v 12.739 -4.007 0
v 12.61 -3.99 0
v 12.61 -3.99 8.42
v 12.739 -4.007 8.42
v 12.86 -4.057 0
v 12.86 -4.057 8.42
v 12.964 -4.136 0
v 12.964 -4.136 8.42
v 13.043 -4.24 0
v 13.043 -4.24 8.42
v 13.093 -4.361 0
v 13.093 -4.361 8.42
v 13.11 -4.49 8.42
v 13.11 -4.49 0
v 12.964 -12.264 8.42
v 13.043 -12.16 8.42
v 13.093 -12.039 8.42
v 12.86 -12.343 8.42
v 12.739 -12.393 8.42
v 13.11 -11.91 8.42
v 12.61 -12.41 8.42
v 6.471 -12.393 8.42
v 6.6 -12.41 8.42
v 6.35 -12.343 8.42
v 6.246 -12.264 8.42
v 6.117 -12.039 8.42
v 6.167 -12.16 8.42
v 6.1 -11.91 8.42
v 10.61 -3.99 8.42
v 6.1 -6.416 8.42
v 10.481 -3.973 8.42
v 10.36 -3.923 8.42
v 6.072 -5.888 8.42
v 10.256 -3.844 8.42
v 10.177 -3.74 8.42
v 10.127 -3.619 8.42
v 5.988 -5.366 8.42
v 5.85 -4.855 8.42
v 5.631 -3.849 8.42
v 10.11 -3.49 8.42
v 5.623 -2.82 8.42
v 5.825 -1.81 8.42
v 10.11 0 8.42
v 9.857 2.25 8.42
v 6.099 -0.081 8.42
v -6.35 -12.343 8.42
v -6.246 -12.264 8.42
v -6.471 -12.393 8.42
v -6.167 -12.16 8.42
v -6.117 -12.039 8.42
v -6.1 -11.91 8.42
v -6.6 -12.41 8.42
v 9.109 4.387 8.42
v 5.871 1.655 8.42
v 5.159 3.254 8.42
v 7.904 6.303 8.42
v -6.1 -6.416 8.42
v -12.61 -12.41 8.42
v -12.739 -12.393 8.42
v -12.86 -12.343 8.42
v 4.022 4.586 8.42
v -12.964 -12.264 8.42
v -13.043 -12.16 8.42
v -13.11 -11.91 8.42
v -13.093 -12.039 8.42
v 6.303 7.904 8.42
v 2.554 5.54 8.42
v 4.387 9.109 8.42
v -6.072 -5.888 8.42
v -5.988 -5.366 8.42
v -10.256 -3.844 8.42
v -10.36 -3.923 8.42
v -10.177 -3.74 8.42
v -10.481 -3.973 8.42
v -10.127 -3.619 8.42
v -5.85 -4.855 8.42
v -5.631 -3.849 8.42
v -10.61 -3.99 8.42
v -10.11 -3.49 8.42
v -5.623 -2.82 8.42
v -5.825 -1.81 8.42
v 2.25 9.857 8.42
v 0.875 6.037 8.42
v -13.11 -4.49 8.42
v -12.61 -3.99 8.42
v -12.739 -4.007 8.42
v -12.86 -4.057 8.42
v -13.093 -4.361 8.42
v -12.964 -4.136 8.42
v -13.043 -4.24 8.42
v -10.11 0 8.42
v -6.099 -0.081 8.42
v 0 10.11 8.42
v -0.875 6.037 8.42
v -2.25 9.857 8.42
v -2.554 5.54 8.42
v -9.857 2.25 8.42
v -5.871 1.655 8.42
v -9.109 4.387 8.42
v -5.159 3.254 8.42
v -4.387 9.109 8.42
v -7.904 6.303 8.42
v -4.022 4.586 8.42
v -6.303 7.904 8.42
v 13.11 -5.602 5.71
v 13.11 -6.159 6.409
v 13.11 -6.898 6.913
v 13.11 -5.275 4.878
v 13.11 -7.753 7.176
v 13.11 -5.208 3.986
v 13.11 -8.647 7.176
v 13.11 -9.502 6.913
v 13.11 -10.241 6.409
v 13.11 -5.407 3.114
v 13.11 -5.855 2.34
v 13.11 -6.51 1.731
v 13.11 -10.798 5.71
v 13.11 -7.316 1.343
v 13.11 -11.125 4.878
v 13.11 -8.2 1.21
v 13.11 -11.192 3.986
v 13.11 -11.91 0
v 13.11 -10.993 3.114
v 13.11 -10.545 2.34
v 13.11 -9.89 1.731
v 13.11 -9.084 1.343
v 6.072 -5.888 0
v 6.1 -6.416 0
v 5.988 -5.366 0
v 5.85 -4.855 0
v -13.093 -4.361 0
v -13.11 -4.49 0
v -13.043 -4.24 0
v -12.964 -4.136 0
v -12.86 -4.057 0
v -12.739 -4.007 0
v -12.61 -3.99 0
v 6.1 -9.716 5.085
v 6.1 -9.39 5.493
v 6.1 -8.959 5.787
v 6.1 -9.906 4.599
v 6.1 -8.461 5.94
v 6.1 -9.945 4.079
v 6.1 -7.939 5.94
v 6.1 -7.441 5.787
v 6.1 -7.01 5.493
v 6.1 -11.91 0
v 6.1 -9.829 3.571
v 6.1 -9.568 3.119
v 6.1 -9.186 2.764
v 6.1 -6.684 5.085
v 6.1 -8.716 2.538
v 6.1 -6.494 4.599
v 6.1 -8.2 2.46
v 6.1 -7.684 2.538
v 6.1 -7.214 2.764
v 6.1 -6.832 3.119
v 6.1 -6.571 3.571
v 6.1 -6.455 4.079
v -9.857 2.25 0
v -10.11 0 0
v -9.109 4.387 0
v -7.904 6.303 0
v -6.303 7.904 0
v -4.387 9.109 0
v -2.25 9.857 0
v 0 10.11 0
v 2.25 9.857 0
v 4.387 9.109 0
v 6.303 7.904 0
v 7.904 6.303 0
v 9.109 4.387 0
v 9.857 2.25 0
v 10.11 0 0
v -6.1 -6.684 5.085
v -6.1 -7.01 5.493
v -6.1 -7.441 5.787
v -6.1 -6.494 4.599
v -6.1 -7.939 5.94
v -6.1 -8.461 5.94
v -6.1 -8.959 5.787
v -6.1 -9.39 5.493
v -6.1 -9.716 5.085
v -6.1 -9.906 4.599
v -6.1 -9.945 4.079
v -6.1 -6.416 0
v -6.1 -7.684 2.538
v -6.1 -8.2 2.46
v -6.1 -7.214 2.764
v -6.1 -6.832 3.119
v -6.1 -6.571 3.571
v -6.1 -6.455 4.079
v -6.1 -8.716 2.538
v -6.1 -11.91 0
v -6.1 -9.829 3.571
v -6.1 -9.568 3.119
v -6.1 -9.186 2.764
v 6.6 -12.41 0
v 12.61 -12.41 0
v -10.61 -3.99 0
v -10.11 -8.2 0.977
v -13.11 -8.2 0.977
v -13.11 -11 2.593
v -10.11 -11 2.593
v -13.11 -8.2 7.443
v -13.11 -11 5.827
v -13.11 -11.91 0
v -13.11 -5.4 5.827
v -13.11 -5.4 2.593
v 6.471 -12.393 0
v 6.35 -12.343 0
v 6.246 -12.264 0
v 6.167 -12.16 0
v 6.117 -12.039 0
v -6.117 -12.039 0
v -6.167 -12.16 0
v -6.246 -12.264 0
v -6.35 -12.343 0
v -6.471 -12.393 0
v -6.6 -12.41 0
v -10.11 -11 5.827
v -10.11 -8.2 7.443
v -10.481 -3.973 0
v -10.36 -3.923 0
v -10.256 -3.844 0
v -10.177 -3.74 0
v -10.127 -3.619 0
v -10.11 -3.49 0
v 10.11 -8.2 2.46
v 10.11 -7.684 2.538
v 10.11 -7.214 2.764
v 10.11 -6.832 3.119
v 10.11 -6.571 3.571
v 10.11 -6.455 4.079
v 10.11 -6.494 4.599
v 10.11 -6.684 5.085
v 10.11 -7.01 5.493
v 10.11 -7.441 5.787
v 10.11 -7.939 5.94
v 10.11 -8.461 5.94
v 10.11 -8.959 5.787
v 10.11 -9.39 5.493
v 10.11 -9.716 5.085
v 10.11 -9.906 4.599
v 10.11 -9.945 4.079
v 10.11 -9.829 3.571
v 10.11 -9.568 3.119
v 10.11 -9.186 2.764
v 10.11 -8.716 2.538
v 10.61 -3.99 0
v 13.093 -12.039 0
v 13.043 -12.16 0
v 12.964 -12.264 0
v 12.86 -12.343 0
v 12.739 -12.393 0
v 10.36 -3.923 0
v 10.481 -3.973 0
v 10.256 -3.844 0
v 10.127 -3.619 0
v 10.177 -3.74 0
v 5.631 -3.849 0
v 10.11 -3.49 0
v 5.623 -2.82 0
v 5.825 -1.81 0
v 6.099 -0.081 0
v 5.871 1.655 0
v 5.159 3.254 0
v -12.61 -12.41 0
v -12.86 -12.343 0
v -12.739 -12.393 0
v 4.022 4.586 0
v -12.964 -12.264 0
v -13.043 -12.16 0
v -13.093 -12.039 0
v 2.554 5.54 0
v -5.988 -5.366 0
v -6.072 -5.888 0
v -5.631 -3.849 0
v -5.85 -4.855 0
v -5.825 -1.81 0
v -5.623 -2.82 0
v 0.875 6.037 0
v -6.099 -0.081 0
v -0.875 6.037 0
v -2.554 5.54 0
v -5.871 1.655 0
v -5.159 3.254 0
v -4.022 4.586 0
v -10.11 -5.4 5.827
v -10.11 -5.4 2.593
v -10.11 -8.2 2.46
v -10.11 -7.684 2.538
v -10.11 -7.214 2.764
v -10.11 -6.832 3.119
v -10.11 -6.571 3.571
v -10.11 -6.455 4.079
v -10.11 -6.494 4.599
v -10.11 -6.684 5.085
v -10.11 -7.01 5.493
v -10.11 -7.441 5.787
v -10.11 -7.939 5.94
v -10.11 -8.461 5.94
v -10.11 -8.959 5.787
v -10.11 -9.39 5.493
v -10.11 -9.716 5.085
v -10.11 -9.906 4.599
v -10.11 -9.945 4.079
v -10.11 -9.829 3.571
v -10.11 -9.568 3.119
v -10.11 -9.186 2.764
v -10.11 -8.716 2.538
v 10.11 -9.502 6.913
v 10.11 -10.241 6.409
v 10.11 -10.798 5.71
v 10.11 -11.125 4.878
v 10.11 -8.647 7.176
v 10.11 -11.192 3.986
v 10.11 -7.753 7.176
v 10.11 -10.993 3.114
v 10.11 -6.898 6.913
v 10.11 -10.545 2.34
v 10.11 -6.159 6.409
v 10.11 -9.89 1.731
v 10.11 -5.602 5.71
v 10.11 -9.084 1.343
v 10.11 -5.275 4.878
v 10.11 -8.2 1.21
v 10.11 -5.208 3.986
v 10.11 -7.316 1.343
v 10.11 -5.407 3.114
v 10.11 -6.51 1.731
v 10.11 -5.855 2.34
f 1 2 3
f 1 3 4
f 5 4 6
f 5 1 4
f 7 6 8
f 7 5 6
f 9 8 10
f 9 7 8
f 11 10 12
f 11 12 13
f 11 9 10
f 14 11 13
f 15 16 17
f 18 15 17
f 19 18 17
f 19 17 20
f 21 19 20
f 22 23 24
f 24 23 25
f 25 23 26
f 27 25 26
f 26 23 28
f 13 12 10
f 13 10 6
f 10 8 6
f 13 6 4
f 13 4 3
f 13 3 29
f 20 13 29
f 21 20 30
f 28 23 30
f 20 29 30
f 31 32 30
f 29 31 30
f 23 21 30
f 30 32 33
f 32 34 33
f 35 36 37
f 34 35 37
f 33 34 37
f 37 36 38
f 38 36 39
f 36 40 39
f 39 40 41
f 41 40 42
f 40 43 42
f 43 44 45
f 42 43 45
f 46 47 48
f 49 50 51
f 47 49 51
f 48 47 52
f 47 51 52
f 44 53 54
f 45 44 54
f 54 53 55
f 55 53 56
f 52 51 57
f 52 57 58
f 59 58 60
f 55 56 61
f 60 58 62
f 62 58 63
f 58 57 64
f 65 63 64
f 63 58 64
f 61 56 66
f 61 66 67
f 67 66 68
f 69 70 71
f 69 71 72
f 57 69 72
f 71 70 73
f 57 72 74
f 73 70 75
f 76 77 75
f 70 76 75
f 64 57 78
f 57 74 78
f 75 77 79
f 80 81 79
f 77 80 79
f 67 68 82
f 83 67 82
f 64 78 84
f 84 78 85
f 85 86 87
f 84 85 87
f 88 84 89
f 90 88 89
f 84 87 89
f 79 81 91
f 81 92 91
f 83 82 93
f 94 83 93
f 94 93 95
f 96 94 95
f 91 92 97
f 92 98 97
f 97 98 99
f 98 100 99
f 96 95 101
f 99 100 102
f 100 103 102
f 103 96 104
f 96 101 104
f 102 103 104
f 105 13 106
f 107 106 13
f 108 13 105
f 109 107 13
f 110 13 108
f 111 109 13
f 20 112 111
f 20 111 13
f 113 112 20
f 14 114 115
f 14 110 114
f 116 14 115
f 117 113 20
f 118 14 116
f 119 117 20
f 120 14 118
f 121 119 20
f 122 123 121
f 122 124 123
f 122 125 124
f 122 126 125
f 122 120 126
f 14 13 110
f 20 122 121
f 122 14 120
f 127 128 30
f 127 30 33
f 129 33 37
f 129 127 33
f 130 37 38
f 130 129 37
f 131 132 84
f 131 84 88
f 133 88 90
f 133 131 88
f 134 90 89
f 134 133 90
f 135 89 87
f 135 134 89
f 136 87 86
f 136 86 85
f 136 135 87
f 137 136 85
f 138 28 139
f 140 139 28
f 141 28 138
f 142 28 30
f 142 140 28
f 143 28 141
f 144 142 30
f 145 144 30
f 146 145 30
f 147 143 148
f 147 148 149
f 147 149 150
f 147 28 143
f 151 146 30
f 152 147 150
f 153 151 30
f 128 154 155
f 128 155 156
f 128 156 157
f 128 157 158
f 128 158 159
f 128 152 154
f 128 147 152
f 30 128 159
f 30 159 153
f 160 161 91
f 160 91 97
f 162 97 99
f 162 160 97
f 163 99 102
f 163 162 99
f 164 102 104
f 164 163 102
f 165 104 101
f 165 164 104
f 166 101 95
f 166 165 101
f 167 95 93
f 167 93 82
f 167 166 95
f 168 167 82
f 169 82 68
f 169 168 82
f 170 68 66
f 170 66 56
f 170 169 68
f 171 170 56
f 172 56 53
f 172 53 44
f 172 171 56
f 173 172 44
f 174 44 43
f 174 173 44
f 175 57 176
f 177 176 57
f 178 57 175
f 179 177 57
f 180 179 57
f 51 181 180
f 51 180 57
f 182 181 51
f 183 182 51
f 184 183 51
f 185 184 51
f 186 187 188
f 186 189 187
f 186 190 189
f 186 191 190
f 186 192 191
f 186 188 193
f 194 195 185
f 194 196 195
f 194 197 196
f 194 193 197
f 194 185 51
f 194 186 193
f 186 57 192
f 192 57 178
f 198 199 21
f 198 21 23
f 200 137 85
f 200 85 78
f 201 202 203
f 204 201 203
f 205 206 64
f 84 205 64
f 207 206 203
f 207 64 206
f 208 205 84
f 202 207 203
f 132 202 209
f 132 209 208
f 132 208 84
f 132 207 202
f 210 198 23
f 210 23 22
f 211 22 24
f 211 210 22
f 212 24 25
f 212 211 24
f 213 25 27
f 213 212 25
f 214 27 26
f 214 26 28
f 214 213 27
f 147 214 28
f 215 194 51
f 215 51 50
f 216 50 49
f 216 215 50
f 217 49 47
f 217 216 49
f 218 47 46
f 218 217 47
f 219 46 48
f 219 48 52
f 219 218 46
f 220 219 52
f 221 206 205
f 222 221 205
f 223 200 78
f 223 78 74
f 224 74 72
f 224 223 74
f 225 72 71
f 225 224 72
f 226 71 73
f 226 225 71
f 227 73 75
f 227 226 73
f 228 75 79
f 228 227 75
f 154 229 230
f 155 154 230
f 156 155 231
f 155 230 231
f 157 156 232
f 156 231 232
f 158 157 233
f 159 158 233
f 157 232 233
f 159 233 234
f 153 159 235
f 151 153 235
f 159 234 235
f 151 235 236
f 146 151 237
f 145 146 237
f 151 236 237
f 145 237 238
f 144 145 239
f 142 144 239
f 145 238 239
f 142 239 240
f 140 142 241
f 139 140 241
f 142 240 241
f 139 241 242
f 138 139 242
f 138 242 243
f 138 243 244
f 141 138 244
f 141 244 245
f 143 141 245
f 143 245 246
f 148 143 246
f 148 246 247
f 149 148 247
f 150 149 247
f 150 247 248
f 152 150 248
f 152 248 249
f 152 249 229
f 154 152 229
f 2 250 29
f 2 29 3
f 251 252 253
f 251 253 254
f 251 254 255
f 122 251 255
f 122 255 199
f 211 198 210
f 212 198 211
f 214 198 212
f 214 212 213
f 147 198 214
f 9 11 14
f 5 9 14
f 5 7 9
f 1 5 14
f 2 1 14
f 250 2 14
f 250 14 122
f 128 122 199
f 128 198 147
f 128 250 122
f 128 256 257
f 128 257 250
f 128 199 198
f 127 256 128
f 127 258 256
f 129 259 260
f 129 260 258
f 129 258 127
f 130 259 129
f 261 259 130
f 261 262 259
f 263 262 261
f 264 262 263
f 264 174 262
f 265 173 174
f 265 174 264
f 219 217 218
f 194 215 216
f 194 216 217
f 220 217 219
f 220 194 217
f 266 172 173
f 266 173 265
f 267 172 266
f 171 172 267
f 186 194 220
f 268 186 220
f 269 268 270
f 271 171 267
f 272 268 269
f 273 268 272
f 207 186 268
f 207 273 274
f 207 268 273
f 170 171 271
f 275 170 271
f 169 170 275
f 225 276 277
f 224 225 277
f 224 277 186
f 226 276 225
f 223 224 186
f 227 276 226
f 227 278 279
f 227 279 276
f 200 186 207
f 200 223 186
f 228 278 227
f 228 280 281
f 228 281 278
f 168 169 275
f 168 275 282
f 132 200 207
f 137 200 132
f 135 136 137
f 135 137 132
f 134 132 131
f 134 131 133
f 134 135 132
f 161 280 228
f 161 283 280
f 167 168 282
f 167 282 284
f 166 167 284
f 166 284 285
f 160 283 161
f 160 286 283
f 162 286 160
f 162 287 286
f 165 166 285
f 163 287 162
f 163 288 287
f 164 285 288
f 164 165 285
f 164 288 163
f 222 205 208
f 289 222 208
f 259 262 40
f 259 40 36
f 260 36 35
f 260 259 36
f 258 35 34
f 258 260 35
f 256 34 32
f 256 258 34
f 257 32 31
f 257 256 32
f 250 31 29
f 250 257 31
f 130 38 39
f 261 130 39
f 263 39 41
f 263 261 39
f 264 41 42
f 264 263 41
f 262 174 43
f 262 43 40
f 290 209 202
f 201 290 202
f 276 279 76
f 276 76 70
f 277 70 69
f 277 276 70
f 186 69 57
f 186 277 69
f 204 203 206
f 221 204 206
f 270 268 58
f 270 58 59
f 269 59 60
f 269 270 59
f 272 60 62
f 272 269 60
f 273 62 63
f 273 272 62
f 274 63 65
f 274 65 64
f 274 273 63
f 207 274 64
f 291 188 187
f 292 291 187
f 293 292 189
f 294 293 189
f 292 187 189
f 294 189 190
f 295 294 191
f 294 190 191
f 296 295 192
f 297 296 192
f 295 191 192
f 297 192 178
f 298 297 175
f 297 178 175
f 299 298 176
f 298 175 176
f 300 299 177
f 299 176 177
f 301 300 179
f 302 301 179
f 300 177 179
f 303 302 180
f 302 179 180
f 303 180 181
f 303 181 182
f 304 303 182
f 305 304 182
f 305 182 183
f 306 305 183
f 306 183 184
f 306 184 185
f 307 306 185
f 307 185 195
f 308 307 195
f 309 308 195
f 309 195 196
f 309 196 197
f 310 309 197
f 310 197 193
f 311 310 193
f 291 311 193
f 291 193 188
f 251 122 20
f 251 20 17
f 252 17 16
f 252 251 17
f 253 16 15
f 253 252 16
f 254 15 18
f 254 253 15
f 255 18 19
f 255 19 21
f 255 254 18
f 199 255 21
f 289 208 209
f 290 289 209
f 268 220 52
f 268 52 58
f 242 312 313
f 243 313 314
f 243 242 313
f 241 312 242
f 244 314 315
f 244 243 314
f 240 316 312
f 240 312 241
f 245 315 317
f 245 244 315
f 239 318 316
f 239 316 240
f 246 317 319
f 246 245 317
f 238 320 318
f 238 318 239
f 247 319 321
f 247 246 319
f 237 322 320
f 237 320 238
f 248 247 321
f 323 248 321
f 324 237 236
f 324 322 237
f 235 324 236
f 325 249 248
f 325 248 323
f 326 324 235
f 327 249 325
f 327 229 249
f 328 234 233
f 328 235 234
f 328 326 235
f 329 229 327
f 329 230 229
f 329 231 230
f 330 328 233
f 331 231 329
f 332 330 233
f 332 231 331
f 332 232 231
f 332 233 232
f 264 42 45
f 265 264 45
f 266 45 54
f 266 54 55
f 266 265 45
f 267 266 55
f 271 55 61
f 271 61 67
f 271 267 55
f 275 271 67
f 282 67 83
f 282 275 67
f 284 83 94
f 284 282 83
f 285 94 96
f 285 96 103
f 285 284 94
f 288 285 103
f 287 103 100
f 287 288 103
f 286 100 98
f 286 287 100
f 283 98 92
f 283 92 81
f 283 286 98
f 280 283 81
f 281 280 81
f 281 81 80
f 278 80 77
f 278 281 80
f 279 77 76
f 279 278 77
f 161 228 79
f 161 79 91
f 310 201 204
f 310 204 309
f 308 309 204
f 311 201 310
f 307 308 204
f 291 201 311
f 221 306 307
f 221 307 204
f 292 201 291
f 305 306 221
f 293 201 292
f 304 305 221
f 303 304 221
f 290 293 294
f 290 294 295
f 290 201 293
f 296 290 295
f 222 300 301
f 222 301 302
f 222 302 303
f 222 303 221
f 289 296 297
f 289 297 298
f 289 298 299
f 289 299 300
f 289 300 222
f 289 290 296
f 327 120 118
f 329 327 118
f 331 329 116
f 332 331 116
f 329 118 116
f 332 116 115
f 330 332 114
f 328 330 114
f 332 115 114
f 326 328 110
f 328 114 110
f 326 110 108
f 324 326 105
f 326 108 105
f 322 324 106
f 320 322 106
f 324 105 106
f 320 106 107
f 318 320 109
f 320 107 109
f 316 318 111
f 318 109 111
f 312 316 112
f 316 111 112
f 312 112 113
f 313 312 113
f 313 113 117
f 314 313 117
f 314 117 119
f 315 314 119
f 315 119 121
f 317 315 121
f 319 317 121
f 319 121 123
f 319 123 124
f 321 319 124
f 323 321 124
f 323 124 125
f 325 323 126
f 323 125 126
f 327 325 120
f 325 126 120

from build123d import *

# Parameters (mm, degrees)
BOSS_EXTRUDE1_DEPTH = 8.42
CUT_EXTRUDE1_REACH  = 32.206
SKETCH2_R           = 1.75
SKETCH3_R           = 3
CUT_EXTRUDE2_DEPTH  = 3
CUT_EXTRUDE3_DEPTH  = 3


with BuildPart() as part:
    # Sketch1 → Boss-Extrude1 (new body)
    with BuildSketch(Plane.XY):
        with BuildLine():
            Line((-6.1, -6.416432818), (-6.1, -11.91))
            ThreePointArc((-6.1, -11.91), (-6.246446609, -12.263553391), (-6.6, -12.41))
            Line((-6.6, -12.41), (-12.61, -12.41))
            ThreePointArc((-12.61, -12.41), (-12.963553391, -12.263553391), (-13.11, -11.91))
            Line((-13.11, -11.91), (-13.11, -4.49))
            ThreePointArc((-13.11, -4.49), (-12.963553391, -4.136446609), (-12.61, -3.99))
            Line((-12.61, -3.99), (-10.61, -3.99))
            ThreePointArc((-10.61, -3.99), (-10.256446609, -3.843553391), (-10.11, -3.49))
            Line((-10.11, -3.49), (-10.11, 0))
            ThreePointArc((-10.11, 0), (0, 10.11), (10.11, 0))
            Line((10.11, 0), (10.11, -3.49))
            ThreePointArc((10.11, -3.49), (10.256446609, -3.843553391), (10.61, -3.99))
            Line((10.61, -3.99), (12.61, -3.99))
            ThreePointArc((12.61, -3.99), (12.963553391, -4.136446609), (13.11, -4.49))
            Line((13.11, -4.49), (13.11, -11.91))
            ThreePointArc((13.11, -11.91), (12.963553391, -12.263553391), (12.61, -12.41))
            Line((12.61, -12.41), (6.6, -12.41))
            ThreePointArc((6.6, -12.41), (6.246446609, -12.263553391), (6.1, -11.91))
            Line((6.1, -11.91), (6.1, -6.416432818))
            ThreePointArc((6.1, -6.416432818), (6.037104415, -5.625863403), (5.85, -4.855183318))
            ThreePointArc((5.85, -4.855183318), (5.600165486, -3.334613501), (5.825225225, -1.810179846))
            ThreePointArc((5.825225225, -1.810179846), (0, 6.1), (-5.825225225, -1.810179846))
            ThreePointArc((-5.825225225, -1.810179846), (-5.600165486, -3.334613501), (-5.85, -4.855183318))
            ThreePointArc((-5.85, -4.855183318), (-6.037104415, -5.625863403), (-6.1, -6.416432818))
        make_face()
    extrude(amount=BOSS_EXTRUDE1_DEPTH)

    # Cut-Extrude1: up to this face of the body (flat: up to its plane)
    cut_extrude1_end = Plane(part.part.faces().sort_by_distance((-13.11, -8.2, 4.21))[0])
    # Sketch2 → Cut-Extrude1 (cut, up to the picked face)
    with BuildSketch(Plane(origin=(13.11, 0, 0), x_dir=(0, 0, -1), z_dir=(1, 0, 0)), mode=Mode.PRIVATE) as cut_extrude1_sk1:
        with Locations((-4.21, -8.2)):
            Circle(SKETCH2_R)
    cut_extrude1_tool1 = split(extrude(cut_extrude1_sk1.sketch, amount=-CUT_EXTRUDE1_REACH, mode=Mode.PRIVATE), bisect_by=cut_extrude1_end, keep=Keep.BOTH, mode=Mode.PRIVATE)
    add(cut_extrude1_tool1.solids().sort_by(Axis((13.11, -8.2, 4.21), (-1, 0, 0)))[0], mode=Mode.SUBTRACT)

    # Sketch3 → Cut-Extrude2 (cut)
    with BuildSketch(Plane(origin=(13.11, 0, 0), x_dir=(0, 0, -1), z_dir=(1, 0, 0))):
        with Locations((-4.21, -8.2)):
            Circle(SKETCH3_R)
    extrude(amount=-CUT_EXTRUDE2_DEPTH, mode=Mode.SUBTRACT)

    # Sketch4 → Cut-Extrude3 (cut)
    with BuildSketch(Plane.ZY.offset(13.11)):
        Polygon((7.443161507, -8.2), (5.826580754, -5.4), (2.593419246, -5.4), (0.976838493, -8.2), (2.593419246, -11), (5.826580754, -11), align=None)
    extrude(amount=-CUT_EXTRUDE3_DEPTH, mode=Mode.SUBTRACT)


solid = part.part
